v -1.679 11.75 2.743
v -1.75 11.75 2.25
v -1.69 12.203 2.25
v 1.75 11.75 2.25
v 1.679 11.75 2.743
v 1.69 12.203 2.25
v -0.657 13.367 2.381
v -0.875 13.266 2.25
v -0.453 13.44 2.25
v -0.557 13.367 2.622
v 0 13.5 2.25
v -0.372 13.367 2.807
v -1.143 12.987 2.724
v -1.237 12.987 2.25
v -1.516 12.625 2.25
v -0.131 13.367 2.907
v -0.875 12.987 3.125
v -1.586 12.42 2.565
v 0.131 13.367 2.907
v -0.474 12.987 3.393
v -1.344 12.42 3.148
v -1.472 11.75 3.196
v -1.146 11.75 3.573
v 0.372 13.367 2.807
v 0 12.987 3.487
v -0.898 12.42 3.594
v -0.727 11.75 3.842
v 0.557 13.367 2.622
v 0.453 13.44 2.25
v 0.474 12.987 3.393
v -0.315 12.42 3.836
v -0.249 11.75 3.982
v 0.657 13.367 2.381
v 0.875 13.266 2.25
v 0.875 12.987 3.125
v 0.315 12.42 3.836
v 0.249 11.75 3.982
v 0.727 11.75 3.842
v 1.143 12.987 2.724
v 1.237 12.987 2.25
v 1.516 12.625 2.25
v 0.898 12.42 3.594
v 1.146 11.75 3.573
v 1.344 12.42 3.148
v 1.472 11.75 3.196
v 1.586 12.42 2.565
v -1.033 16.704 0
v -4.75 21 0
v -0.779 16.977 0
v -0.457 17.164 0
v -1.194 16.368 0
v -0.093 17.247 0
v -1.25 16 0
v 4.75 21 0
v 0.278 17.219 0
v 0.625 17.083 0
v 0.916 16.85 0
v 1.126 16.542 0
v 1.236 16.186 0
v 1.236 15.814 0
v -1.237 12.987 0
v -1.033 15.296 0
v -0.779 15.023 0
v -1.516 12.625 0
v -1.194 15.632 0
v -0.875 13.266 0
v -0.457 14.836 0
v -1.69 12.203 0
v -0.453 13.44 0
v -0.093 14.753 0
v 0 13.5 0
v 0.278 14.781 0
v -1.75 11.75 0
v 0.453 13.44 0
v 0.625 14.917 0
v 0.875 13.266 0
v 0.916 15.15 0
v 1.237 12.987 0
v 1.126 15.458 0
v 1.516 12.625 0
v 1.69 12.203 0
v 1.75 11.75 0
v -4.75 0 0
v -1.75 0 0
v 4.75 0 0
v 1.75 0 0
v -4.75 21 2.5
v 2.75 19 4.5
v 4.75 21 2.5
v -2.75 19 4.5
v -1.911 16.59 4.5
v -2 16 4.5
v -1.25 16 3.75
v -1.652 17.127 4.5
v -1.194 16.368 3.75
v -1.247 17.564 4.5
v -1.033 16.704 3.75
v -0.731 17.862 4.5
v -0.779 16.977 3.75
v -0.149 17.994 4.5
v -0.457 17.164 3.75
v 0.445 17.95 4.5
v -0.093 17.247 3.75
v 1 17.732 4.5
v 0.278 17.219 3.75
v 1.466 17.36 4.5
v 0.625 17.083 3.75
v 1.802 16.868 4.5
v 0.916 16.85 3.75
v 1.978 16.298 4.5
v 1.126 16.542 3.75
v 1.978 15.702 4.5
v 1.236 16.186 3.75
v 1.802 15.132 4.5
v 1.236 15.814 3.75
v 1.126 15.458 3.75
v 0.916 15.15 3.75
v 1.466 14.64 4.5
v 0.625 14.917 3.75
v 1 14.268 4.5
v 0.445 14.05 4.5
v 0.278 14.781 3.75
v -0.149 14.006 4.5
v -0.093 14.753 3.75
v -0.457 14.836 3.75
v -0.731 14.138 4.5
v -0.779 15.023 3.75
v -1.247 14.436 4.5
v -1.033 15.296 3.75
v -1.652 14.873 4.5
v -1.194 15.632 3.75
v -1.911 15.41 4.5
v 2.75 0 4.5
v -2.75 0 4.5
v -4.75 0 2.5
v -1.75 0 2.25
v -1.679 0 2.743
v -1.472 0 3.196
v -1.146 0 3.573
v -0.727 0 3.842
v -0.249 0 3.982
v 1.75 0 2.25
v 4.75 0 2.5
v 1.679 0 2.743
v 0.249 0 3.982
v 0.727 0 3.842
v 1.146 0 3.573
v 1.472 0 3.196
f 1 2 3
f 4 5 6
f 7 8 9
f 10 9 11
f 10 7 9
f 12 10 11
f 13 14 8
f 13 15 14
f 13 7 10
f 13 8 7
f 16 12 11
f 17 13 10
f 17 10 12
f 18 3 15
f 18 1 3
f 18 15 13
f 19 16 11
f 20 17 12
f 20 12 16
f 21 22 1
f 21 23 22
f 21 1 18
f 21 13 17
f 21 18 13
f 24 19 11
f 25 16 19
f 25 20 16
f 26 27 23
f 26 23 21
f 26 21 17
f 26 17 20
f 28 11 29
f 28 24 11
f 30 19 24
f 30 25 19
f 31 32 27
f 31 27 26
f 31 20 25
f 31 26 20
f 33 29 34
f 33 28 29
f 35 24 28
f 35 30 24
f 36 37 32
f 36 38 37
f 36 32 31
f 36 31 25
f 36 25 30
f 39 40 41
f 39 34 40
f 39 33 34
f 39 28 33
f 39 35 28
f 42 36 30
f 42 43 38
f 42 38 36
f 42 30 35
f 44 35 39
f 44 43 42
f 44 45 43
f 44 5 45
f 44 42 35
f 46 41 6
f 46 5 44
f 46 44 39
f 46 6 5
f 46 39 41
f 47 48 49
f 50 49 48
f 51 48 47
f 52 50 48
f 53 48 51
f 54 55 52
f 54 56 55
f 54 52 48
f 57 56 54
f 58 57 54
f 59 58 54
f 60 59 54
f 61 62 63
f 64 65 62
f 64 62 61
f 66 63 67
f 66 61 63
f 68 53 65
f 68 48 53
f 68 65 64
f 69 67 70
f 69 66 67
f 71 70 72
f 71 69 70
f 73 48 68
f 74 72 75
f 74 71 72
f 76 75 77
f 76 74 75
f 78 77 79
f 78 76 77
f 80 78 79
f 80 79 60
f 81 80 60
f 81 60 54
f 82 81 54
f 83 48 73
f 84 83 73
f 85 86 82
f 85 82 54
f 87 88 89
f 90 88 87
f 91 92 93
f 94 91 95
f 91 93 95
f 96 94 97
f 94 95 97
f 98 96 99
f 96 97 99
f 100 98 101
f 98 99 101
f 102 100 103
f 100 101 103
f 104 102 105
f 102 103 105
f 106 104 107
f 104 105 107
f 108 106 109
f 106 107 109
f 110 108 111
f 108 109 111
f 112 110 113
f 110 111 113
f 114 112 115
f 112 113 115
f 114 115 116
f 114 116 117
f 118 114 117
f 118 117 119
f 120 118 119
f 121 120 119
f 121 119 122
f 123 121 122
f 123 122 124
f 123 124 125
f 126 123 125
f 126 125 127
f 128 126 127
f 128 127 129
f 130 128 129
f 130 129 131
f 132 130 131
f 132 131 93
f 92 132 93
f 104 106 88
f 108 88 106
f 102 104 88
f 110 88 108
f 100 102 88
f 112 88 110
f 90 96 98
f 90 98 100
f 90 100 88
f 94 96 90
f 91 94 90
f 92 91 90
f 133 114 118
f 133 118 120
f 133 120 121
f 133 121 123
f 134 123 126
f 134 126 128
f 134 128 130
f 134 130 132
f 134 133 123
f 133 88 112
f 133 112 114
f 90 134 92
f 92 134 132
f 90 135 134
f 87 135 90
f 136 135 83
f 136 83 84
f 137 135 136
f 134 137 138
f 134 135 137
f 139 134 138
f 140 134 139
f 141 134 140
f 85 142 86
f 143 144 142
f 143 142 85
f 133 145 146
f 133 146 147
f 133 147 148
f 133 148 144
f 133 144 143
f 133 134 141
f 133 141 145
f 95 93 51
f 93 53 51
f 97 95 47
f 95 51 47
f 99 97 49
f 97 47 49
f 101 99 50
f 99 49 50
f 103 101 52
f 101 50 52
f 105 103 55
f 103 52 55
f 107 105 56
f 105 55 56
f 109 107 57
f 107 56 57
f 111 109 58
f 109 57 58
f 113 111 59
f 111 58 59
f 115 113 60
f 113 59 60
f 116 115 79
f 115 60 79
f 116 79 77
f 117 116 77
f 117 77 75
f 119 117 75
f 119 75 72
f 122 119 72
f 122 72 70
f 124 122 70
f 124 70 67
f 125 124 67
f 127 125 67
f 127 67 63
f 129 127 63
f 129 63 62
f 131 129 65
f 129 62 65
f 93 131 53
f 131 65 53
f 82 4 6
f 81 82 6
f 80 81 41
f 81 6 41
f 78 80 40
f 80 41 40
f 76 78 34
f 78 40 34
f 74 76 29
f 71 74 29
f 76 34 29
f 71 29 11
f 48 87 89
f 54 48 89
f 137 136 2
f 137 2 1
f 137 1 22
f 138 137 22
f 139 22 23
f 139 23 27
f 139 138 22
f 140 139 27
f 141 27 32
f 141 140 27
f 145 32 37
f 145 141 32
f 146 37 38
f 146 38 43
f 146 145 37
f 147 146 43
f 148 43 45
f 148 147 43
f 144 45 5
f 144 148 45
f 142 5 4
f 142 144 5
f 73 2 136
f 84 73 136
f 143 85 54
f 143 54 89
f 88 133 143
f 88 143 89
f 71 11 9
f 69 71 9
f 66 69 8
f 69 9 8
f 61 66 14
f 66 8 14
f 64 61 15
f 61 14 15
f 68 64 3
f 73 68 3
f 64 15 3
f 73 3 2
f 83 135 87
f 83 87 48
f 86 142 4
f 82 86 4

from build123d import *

# Parameters (mm, degrees)
F6_DEPTH        = 21
F7_SIZE         = 2
F8_SIZE         = 2
F12_DEPTH       = 2.251
F14_D           = 2.5
F14_CSINK_D     = 4
F14_CSINK_ANGLE = 90


# Not quite as in the source:
# - a feature names something its author has since deleted; it is built from what else it names


with BuildPart() as f6:
    # F5 (on Front) → F6 (new body)
    with BuildSketch(Plane.XZ):
        with BuildLine():
            Line((4.75, 0), (4.75, 4.5))
            Line((4.75, 4.5), (-4.75, 4.5))
            Line((-4.75, 4.5), (-4.75, 0))
            Line((-4.75, 0), (-1.75, 0))
            Line((-1.75, 0), (-1.75, 2.25))
            ThreePointArc((-1.75, 2.25), (0, 4), (1.75, 2.25))
            Line((1.75, 2.25), (1.75, 0))
            Line((1.75, 0), (4.75, 0))
        make_face()
        with BuildLine():
            Line((-1.75, 0), (1.75, 0))
            Line((1.75, 0), (1.75, 2.25))
            ThreePointArc((1.75, 2.25), (0, 4), (-1.75, 2.25))
            Line((-1.75, 2.25), (-1.75, 0))
        make_face()
    extrude(amount=-F6_DEPTH)

    # F7
    f7_edges = [f6.edges().sort_by_distance(p)[0] for p in [
        (-4.75, 10.5, 4.5),
        (4.75, 10.5, 4.5),
    ]]
    chamfer(f7_edges, length=F7_SIZE)

    # F8
    f8_edges = [f6.edges().sort_by_distance(p)[0] for p in [
        (0, 21, 4.5),
    ]]
    chamfer(f8_edges, length=F8_SIZE)

    # F10 (on offset) → F11 (revolve, cut)
    with BuildSketch(Plane.XY.offset(2.25)):
        with BuildLine():
            Line((-1.75, 11.75), (-1.75, 0))
            Line((-1.75, 0), (0, 0))
            Line((0, 0), (0, 13.5))
            ThreePointArc((0, 13.5), (-1.2374368671, 12.9874368671), (-1.75, 11.75))
        make_face()
    revolve(axis=Axis((0, 6.75, 2.25), (0, 1, 0)), mode=Mode.SUBTRACT)

    # F10 (on offset) → F12 (cut, through all)
    with BuildSketch(Plane.XY.offset(2.25)):
        with BuildLine():
            Line((-1.75, 11.75), (-1.75, 0))
            Line((-1.75, 0), (0, 0))
            Line((0, 0), (0, 13.5))
            ThreePointArc((0, 13.5), (-1.2374368671, 12.9874368671), (-1.75, 11.75))
        make_face()
        with BuildLine():
            Line((0, 13.5), (0, 0))
            Line((0, 0), (1.75, 0))
            Line((1.75, 0), (1.75, 11.75))
            ThreePointArc((1.75, 11.75), (1.2374368671, 12.9874368671), (0, 13.5))
        make_face()
    extrude(amount=-F12_DEPTH, mode=Mode.SUBTRACT)

    # F14 (through all)
    with Locations(Plane.XY.offset(4.5)):
        with Locations((0, 16)):
            CounterSinkHole(F14_D / 2, F14_CSINK_D / 2, counter_sink_angle=F14_CSINK_ANGLE)


solid = f6.part
